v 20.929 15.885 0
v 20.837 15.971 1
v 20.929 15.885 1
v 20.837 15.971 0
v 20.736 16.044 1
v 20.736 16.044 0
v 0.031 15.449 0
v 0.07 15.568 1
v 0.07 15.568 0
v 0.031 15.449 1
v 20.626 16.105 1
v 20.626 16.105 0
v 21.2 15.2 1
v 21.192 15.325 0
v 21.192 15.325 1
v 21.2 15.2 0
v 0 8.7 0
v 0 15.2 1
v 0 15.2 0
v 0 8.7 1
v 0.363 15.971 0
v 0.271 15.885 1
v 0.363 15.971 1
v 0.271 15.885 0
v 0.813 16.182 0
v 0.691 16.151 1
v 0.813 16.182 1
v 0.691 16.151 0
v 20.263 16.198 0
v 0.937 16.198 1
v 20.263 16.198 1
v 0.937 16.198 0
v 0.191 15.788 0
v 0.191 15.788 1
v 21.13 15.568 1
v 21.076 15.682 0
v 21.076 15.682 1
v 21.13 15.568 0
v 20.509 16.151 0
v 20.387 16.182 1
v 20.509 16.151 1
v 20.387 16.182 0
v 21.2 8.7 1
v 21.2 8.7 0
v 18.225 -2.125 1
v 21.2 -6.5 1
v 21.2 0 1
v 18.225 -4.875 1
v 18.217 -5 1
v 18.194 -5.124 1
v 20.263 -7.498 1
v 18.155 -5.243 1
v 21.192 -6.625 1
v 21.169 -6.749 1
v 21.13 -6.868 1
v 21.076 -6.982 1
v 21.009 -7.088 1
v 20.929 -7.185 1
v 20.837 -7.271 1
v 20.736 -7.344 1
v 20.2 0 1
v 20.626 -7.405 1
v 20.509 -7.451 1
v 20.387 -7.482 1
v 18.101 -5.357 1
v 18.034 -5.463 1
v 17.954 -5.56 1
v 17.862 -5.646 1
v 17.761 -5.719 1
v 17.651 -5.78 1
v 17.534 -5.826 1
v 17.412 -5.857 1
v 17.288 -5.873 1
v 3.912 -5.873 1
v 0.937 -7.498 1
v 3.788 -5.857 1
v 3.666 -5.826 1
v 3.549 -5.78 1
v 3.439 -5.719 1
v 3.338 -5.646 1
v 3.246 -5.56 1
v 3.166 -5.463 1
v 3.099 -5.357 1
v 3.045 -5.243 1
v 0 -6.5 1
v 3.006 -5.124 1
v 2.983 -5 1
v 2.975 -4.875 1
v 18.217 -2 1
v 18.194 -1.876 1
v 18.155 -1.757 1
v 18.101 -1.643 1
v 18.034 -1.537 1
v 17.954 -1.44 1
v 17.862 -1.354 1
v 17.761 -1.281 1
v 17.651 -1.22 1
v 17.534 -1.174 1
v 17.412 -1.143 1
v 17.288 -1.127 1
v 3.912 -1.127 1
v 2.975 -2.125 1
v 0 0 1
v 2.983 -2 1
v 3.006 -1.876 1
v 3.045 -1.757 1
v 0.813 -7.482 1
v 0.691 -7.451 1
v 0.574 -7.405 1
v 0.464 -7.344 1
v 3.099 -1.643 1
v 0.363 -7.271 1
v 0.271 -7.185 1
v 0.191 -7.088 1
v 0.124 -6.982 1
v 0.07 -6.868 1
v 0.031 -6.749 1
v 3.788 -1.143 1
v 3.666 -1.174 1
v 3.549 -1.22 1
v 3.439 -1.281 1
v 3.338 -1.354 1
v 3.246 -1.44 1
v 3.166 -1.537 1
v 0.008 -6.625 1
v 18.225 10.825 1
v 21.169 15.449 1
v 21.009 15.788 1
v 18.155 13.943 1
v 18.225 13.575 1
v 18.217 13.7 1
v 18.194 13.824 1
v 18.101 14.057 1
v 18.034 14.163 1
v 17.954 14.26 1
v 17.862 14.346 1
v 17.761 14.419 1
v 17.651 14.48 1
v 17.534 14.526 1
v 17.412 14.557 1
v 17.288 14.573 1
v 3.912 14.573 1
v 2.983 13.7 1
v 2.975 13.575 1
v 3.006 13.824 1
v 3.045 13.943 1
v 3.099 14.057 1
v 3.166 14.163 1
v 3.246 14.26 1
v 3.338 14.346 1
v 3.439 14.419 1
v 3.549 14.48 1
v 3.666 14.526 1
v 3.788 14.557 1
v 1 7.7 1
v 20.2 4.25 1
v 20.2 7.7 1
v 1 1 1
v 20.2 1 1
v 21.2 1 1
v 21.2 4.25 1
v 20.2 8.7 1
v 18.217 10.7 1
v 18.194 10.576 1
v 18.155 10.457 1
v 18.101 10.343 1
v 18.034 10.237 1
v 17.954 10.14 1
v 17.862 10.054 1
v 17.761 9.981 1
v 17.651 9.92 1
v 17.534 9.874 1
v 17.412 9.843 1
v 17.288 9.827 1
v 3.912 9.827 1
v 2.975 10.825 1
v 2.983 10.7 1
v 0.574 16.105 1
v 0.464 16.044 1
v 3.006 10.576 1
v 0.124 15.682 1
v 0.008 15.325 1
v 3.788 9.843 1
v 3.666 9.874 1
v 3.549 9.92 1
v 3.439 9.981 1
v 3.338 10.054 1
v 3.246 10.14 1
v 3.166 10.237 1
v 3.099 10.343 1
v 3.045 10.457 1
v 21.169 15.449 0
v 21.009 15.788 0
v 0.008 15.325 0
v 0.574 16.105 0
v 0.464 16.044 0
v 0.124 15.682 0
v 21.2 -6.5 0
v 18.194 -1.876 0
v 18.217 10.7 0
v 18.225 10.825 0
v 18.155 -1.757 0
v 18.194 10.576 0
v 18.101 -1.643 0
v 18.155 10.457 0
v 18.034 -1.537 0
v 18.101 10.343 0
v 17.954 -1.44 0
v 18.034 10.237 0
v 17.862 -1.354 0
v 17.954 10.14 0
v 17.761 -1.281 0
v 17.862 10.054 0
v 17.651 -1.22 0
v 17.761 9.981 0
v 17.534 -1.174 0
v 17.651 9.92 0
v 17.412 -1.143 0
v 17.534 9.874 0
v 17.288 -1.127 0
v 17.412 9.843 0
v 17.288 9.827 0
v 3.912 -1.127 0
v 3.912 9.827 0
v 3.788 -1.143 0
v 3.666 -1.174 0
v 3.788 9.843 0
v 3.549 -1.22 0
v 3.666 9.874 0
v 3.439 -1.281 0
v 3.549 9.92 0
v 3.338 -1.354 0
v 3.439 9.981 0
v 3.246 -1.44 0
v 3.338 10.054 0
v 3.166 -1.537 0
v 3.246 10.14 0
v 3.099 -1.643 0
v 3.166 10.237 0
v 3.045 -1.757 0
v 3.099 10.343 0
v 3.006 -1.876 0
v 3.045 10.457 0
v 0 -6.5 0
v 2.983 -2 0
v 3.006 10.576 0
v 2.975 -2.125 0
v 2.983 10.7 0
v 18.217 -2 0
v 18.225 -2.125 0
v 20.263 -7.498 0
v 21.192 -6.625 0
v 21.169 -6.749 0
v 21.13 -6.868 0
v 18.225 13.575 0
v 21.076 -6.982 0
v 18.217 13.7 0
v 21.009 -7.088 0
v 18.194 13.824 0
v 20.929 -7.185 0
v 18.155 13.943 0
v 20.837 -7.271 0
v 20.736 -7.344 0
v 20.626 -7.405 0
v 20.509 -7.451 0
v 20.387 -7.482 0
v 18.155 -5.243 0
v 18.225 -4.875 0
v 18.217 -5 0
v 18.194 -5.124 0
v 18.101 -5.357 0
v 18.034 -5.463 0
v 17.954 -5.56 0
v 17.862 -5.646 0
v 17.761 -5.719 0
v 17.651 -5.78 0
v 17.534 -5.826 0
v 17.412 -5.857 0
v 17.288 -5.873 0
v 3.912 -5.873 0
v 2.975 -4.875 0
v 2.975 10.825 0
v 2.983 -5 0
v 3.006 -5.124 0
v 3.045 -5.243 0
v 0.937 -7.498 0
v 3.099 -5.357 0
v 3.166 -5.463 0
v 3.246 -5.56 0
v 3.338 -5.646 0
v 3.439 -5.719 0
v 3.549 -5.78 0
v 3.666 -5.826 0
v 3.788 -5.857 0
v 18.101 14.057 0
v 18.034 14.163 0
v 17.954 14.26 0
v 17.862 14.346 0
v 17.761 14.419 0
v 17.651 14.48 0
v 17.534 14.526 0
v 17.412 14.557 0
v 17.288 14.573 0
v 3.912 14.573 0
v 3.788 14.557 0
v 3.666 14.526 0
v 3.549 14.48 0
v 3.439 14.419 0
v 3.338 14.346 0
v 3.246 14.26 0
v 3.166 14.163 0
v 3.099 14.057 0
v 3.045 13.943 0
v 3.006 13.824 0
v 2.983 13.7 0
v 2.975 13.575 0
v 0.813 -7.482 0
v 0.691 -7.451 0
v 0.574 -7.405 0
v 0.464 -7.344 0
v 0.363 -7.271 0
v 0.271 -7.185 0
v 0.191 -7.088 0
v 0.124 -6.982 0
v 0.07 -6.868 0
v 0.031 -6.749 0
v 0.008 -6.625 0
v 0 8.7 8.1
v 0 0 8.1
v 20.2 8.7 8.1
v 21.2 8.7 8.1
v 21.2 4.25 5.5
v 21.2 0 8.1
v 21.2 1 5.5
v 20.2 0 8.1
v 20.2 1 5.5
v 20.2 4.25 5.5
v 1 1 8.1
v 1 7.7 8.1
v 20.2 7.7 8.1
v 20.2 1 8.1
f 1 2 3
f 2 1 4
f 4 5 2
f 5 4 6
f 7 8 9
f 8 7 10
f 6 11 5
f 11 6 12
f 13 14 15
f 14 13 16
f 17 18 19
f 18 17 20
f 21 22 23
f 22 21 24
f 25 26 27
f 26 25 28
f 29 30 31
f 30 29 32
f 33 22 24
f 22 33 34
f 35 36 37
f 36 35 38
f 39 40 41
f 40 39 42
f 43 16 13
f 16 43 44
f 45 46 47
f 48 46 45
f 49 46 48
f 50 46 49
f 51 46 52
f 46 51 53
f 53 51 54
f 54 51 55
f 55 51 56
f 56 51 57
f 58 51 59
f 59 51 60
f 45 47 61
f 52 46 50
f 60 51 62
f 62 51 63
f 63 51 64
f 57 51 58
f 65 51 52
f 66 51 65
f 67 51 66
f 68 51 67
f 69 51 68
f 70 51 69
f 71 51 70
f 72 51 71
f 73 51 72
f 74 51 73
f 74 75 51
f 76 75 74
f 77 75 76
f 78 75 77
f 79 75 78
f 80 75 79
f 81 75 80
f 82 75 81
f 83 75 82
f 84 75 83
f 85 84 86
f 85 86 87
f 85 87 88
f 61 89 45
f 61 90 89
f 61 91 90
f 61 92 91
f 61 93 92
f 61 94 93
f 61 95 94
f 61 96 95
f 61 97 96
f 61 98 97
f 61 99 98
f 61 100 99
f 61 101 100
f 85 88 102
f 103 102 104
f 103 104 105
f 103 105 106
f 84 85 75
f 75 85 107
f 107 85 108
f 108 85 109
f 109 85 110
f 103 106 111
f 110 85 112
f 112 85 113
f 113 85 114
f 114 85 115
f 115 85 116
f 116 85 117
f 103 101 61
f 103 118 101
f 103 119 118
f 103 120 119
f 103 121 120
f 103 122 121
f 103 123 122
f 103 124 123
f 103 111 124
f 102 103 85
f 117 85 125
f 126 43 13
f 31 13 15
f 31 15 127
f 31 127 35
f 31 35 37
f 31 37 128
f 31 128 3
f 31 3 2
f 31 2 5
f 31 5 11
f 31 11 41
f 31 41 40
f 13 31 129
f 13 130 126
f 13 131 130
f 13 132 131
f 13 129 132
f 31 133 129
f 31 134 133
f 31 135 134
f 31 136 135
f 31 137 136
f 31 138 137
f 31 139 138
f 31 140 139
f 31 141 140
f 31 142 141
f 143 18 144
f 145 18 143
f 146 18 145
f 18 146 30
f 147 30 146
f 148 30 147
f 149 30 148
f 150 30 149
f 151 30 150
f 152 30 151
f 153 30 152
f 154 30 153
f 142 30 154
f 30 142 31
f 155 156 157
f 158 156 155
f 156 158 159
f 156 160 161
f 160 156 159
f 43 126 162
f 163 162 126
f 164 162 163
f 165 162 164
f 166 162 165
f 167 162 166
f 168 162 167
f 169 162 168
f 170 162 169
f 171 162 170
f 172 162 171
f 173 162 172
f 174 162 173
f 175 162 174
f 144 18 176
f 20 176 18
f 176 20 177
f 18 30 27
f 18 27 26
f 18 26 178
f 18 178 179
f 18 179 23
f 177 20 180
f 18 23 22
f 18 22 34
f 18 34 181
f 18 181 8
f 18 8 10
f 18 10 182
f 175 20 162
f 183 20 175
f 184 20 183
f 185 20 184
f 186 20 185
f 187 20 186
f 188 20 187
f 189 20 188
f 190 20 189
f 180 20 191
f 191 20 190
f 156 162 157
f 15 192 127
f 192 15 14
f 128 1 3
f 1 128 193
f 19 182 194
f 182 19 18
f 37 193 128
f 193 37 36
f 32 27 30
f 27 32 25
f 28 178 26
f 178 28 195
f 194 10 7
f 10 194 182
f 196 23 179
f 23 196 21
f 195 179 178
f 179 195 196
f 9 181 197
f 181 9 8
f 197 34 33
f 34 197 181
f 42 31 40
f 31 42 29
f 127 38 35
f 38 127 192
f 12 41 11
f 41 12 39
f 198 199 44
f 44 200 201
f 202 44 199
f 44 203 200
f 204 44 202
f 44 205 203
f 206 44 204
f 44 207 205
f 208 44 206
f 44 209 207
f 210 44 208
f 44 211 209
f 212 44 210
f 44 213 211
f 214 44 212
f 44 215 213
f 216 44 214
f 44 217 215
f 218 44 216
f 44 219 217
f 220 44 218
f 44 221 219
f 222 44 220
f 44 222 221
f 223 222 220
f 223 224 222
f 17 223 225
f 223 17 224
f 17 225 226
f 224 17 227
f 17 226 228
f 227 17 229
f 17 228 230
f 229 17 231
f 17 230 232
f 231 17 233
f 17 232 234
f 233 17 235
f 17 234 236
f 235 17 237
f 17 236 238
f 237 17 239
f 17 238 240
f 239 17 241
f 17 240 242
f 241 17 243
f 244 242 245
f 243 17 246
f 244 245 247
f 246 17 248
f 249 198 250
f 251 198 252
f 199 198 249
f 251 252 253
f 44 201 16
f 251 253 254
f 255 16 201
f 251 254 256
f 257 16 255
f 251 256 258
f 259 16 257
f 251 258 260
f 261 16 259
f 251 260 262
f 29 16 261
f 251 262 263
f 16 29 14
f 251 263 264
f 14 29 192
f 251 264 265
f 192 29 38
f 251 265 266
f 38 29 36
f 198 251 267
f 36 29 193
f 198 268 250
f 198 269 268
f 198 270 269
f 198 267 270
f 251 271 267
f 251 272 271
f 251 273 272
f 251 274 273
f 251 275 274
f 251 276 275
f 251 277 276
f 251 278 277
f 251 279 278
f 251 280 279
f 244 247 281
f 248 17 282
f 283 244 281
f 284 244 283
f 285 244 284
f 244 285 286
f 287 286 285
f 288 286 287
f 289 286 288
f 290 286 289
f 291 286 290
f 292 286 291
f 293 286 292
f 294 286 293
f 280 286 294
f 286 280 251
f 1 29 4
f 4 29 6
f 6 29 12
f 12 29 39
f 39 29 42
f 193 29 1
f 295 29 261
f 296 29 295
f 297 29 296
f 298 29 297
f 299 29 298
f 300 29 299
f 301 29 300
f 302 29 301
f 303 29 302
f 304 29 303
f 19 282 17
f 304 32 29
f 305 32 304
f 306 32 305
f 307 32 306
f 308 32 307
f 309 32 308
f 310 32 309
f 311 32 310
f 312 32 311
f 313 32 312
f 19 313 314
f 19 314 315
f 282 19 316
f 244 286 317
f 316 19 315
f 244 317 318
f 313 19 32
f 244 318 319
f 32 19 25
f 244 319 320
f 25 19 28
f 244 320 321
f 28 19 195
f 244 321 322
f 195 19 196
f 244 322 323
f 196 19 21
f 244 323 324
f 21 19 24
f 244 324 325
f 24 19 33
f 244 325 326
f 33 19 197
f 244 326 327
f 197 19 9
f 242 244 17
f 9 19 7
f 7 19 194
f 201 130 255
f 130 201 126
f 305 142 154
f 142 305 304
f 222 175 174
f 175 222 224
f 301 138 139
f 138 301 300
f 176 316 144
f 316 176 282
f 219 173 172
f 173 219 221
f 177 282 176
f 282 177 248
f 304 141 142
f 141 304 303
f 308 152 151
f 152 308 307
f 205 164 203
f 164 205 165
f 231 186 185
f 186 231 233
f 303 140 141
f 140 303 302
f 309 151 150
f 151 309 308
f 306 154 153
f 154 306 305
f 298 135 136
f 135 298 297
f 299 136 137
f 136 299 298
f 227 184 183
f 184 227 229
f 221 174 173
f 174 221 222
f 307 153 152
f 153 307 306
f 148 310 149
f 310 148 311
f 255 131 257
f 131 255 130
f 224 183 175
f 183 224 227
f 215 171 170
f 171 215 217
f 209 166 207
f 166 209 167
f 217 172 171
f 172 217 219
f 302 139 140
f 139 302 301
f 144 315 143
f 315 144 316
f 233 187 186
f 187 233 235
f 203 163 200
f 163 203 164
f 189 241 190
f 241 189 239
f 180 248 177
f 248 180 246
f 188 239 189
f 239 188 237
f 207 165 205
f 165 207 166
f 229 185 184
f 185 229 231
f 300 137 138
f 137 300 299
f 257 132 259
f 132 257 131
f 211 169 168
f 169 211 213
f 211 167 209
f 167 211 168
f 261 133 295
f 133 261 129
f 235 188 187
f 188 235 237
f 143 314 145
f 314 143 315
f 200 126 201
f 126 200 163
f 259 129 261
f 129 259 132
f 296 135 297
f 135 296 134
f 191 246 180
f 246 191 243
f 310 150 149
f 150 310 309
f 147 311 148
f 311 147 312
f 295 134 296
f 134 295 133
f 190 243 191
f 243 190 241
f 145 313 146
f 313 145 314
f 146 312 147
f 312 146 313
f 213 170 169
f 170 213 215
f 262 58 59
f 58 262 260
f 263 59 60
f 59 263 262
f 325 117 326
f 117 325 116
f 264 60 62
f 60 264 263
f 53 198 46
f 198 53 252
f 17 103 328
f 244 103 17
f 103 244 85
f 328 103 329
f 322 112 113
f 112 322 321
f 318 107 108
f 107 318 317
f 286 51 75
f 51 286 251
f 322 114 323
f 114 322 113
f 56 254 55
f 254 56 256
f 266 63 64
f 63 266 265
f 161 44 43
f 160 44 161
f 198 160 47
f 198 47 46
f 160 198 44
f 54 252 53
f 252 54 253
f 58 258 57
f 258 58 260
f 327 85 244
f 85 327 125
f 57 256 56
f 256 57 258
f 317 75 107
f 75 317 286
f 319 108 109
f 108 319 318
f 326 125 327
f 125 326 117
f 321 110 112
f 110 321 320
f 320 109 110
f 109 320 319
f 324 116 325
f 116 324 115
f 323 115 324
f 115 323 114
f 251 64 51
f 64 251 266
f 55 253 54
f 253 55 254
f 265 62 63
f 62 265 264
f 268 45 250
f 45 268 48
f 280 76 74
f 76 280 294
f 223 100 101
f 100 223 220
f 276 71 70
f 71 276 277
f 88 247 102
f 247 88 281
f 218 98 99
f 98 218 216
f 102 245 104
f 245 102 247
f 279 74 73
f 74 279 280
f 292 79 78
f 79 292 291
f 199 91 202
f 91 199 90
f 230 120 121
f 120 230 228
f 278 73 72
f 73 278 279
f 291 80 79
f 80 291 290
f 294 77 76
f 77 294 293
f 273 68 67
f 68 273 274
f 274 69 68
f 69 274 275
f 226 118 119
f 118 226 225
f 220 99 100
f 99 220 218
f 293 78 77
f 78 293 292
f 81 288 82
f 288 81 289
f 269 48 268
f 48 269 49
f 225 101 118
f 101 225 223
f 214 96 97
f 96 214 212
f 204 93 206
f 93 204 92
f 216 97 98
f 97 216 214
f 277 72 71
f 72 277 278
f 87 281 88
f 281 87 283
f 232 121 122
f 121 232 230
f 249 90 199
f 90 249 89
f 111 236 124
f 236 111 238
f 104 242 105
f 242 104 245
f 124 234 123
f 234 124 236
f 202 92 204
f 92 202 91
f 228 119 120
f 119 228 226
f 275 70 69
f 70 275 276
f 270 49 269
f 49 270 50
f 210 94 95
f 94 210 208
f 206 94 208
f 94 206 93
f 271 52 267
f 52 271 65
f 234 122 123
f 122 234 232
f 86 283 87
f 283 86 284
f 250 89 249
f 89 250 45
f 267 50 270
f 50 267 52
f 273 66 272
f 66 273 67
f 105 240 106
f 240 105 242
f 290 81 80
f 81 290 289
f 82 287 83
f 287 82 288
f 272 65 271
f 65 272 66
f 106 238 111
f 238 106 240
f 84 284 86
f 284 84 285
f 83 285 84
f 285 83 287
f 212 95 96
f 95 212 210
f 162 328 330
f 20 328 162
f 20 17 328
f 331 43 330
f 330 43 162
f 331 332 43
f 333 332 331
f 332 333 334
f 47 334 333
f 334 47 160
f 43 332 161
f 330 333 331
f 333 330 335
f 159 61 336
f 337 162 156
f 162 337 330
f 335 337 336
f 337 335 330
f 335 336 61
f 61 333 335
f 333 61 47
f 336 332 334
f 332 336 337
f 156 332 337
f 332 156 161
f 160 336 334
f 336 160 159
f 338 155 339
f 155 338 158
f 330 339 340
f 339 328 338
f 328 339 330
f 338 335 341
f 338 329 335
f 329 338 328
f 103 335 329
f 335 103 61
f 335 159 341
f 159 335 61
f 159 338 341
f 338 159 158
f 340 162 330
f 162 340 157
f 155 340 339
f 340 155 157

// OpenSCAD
/*motor_length = 16;
motor_width = 6;
motor_height = 5;*/

motor_length = 19;
motor_width = 6.5;
motor_height = 6;

case_strength = 1;

case_margin = 0.1;

module round_corner()
{

}

module mounting_plate()
{
	union()
	{
		difference()
		{
			translate([case_strength, 0, 0])
			minkowski($fn=50)
			{
				cube([motor_length + case_strength * 2 + case_margin * 2 - case_strength*2, motor_width, case_strength/2]);
				cylinder(r=case_strength, h=case_strength/2);
			}

			translate([(motor_length * 0.125) + case_strength * 1.5 + case_margin, motor_width/4 + case_strength/2, -case_strength/2])
			minkowski($fn=50)
			{
				cube([motor_length * 0.75 - case_strength, motor_width/2 - case_strength/2, case_strength * 2]);
				cylinder(r=case_strength, h=case_strength);
			}
		}
	}
}

module case()
{
	union() {
		// bottom
		union() {
			cube([motor_length + case_strength * 2 + case_margin * 2, motor_width + case_strength * 2 + case_margin * 2, case_strength]);

			translate([0, motor_width + case_strength * 2 + case_margin * 2, 0])
			mounting_plate();

			translate([0, 0, 0])
			scale([1, -1, 1])
			mounting_plate();
		}

		// front wall
		translate([0, 0, case_strength])
		cube([case_strength, motor_width + case_strength * 2 + case_margin * 2, motor_height + case_strength + case_margin]);

		// back wall
		translate([motor_length + case_strength + case_margin * 2, 0, case_strength])
		difference()
		{
			cube([case_strength, motor_width + case_strength * 2 + case_margin * 2, motor_height + case_strength + case_margin]);

			translate([-case_strength/2, case_strength, 0])
			cube([case_strength*2, motor_width/2, motor_height * 0.75]);
		}

		// side wall right
		translate([case_strength, 0, case_strength])
		cube([motor_length + case_margin * 2, case_strength, motor_height + case_strength + case_margin]);

		// side wall left
		translate([case_strength, motor_width + case_strength + case_margin * 2, case_strength])
		cube([motor_length + case_margin * 2, case_strength, motor_height + case_strength + case_margin]);
	}
}

module case_cap()
{
	union() {
		// Top part
		translate([0, 0, case_strength])
		cube([motor_length + case_strength * 2 + case_margin * 2, motor_width + case_strength * 2 + case_margin * 2, case_strength]);

		// insert
		translate([case_strength + case_margin, case_strength + case_margin, case_margin])
		cube([motor_length, motor_width, case_strength - case_margin]);
	}
}

module motor_dummy()
{
	cube([motor_length, motor_width, motor_height]);
}

case();

//translate([0, 0, motor_height + case_strength + case_margin * 2])
//%case_cap();

//rotate([180, 0, 0])
//translate([0, -(motor_width + case_strength * 2 + case_margin * 2), -(case_strength*2)])
//case_cap();

//translate([case_strength + case_margin, case_strength + case_margin, case_strength + case_margin])
//motor_dummy();
